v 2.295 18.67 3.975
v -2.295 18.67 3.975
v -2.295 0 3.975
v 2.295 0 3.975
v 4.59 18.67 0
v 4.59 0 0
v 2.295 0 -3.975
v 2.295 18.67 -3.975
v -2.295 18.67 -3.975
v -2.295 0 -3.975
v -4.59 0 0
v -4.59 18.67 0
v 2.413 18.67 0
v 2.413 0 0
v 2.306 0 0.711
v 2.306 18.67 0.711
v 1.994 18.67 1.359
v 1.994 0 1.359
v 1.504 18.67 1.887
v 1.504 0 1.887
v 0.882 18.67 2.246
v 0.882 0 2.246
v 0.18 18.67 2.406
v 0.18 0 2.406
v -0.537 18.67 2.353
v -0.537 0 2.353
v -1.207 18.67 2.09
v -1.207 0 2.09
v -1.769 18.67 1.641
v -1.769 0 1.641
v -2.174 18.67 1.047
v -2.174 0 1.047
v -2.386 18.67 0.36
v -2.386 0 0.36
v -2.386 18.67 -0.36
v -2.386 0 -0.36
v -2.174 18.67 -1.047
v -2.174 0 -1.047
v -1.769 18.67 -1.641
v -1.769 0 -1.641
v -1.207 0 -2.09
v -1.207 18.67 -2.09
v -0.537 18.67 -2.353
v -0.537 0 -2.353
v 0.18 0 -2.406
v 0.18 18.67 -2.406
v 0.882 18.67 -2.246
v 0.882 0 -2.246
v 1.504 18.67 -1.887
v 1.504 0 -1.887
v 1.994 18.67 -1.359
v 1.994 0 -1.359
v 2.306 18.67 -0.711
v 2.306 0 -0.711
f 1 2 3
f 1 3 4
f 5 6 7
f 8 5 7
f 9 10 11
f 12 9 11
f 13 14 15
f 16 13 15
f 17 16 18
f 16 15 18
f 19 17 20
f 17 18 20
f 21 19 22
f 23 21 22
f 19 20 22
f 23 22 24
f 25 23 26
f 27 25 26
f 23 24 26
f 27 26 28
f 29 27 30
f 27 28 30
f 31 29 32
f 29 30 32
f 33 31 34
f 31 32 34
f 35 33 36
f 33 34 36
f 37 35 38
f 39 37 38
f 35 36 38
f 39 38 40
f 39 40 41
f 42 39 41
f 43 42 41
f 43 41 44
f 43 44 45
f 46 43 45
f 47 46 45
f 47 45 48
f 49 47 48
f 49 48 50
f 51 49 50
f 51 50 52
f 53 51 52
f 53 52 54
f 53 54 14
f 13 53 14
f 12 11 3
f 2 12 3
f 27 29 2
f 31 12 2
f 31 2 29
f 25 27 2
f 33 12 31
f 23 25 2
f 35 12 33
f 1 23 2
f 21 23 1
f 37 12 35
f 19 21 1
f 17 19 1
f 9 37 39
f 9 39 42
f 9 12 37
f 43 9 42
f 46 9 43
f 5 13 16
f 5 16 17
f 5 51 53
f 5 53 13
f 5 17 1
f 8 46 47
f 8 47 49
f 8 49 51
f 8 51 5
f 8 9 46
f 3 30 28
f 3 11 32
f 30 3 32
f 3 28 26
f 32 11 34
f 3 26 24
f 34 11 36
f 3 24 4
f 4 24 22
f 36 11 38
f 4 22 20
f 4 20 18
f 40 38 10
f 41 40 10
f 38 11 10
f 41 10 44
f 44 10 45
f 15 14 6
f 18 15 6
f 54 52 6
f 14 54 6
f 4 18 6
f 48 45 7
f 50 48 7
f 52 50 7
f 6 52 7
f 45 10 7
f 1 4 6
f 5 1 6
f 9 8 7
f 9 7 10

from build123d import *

# Parameters (mm, degrees)
BOSS_EXTRUDE1_DEPTH    = 18.67
F_10_24_TAPPED_HOLE1_D = 4.826


with BuildPart() as part:
    # Sketch1 → Boss-Extrude1 (new body)
    with BuildSketch(Plane(origin=(0, 0, 0), x_dir=(1, 0, 0), z_dir=(0, 1, 0))):
        Polygon((4.58993464, 0), (2.29496732, 3.975), (-2.29496732, 3.975), (-4.58993464, 0), (-2.29496732, -3.975), (2.29496732, -3.975), align=None)
    extrude(amount=BOSS_EXTRUDE1_DEPTH)

    # #10-24 Tapped Hole1 (through all)
    with Locations(Plane(origin=(0, 18.67, 0), x_dir=(-1, 0, 0), z_dir=(0, 1, 0))):
        with Locations((0, 0)):
            Hole(F_10_24_TAPPED_HOLE1_D / 2)


solid = part.part
